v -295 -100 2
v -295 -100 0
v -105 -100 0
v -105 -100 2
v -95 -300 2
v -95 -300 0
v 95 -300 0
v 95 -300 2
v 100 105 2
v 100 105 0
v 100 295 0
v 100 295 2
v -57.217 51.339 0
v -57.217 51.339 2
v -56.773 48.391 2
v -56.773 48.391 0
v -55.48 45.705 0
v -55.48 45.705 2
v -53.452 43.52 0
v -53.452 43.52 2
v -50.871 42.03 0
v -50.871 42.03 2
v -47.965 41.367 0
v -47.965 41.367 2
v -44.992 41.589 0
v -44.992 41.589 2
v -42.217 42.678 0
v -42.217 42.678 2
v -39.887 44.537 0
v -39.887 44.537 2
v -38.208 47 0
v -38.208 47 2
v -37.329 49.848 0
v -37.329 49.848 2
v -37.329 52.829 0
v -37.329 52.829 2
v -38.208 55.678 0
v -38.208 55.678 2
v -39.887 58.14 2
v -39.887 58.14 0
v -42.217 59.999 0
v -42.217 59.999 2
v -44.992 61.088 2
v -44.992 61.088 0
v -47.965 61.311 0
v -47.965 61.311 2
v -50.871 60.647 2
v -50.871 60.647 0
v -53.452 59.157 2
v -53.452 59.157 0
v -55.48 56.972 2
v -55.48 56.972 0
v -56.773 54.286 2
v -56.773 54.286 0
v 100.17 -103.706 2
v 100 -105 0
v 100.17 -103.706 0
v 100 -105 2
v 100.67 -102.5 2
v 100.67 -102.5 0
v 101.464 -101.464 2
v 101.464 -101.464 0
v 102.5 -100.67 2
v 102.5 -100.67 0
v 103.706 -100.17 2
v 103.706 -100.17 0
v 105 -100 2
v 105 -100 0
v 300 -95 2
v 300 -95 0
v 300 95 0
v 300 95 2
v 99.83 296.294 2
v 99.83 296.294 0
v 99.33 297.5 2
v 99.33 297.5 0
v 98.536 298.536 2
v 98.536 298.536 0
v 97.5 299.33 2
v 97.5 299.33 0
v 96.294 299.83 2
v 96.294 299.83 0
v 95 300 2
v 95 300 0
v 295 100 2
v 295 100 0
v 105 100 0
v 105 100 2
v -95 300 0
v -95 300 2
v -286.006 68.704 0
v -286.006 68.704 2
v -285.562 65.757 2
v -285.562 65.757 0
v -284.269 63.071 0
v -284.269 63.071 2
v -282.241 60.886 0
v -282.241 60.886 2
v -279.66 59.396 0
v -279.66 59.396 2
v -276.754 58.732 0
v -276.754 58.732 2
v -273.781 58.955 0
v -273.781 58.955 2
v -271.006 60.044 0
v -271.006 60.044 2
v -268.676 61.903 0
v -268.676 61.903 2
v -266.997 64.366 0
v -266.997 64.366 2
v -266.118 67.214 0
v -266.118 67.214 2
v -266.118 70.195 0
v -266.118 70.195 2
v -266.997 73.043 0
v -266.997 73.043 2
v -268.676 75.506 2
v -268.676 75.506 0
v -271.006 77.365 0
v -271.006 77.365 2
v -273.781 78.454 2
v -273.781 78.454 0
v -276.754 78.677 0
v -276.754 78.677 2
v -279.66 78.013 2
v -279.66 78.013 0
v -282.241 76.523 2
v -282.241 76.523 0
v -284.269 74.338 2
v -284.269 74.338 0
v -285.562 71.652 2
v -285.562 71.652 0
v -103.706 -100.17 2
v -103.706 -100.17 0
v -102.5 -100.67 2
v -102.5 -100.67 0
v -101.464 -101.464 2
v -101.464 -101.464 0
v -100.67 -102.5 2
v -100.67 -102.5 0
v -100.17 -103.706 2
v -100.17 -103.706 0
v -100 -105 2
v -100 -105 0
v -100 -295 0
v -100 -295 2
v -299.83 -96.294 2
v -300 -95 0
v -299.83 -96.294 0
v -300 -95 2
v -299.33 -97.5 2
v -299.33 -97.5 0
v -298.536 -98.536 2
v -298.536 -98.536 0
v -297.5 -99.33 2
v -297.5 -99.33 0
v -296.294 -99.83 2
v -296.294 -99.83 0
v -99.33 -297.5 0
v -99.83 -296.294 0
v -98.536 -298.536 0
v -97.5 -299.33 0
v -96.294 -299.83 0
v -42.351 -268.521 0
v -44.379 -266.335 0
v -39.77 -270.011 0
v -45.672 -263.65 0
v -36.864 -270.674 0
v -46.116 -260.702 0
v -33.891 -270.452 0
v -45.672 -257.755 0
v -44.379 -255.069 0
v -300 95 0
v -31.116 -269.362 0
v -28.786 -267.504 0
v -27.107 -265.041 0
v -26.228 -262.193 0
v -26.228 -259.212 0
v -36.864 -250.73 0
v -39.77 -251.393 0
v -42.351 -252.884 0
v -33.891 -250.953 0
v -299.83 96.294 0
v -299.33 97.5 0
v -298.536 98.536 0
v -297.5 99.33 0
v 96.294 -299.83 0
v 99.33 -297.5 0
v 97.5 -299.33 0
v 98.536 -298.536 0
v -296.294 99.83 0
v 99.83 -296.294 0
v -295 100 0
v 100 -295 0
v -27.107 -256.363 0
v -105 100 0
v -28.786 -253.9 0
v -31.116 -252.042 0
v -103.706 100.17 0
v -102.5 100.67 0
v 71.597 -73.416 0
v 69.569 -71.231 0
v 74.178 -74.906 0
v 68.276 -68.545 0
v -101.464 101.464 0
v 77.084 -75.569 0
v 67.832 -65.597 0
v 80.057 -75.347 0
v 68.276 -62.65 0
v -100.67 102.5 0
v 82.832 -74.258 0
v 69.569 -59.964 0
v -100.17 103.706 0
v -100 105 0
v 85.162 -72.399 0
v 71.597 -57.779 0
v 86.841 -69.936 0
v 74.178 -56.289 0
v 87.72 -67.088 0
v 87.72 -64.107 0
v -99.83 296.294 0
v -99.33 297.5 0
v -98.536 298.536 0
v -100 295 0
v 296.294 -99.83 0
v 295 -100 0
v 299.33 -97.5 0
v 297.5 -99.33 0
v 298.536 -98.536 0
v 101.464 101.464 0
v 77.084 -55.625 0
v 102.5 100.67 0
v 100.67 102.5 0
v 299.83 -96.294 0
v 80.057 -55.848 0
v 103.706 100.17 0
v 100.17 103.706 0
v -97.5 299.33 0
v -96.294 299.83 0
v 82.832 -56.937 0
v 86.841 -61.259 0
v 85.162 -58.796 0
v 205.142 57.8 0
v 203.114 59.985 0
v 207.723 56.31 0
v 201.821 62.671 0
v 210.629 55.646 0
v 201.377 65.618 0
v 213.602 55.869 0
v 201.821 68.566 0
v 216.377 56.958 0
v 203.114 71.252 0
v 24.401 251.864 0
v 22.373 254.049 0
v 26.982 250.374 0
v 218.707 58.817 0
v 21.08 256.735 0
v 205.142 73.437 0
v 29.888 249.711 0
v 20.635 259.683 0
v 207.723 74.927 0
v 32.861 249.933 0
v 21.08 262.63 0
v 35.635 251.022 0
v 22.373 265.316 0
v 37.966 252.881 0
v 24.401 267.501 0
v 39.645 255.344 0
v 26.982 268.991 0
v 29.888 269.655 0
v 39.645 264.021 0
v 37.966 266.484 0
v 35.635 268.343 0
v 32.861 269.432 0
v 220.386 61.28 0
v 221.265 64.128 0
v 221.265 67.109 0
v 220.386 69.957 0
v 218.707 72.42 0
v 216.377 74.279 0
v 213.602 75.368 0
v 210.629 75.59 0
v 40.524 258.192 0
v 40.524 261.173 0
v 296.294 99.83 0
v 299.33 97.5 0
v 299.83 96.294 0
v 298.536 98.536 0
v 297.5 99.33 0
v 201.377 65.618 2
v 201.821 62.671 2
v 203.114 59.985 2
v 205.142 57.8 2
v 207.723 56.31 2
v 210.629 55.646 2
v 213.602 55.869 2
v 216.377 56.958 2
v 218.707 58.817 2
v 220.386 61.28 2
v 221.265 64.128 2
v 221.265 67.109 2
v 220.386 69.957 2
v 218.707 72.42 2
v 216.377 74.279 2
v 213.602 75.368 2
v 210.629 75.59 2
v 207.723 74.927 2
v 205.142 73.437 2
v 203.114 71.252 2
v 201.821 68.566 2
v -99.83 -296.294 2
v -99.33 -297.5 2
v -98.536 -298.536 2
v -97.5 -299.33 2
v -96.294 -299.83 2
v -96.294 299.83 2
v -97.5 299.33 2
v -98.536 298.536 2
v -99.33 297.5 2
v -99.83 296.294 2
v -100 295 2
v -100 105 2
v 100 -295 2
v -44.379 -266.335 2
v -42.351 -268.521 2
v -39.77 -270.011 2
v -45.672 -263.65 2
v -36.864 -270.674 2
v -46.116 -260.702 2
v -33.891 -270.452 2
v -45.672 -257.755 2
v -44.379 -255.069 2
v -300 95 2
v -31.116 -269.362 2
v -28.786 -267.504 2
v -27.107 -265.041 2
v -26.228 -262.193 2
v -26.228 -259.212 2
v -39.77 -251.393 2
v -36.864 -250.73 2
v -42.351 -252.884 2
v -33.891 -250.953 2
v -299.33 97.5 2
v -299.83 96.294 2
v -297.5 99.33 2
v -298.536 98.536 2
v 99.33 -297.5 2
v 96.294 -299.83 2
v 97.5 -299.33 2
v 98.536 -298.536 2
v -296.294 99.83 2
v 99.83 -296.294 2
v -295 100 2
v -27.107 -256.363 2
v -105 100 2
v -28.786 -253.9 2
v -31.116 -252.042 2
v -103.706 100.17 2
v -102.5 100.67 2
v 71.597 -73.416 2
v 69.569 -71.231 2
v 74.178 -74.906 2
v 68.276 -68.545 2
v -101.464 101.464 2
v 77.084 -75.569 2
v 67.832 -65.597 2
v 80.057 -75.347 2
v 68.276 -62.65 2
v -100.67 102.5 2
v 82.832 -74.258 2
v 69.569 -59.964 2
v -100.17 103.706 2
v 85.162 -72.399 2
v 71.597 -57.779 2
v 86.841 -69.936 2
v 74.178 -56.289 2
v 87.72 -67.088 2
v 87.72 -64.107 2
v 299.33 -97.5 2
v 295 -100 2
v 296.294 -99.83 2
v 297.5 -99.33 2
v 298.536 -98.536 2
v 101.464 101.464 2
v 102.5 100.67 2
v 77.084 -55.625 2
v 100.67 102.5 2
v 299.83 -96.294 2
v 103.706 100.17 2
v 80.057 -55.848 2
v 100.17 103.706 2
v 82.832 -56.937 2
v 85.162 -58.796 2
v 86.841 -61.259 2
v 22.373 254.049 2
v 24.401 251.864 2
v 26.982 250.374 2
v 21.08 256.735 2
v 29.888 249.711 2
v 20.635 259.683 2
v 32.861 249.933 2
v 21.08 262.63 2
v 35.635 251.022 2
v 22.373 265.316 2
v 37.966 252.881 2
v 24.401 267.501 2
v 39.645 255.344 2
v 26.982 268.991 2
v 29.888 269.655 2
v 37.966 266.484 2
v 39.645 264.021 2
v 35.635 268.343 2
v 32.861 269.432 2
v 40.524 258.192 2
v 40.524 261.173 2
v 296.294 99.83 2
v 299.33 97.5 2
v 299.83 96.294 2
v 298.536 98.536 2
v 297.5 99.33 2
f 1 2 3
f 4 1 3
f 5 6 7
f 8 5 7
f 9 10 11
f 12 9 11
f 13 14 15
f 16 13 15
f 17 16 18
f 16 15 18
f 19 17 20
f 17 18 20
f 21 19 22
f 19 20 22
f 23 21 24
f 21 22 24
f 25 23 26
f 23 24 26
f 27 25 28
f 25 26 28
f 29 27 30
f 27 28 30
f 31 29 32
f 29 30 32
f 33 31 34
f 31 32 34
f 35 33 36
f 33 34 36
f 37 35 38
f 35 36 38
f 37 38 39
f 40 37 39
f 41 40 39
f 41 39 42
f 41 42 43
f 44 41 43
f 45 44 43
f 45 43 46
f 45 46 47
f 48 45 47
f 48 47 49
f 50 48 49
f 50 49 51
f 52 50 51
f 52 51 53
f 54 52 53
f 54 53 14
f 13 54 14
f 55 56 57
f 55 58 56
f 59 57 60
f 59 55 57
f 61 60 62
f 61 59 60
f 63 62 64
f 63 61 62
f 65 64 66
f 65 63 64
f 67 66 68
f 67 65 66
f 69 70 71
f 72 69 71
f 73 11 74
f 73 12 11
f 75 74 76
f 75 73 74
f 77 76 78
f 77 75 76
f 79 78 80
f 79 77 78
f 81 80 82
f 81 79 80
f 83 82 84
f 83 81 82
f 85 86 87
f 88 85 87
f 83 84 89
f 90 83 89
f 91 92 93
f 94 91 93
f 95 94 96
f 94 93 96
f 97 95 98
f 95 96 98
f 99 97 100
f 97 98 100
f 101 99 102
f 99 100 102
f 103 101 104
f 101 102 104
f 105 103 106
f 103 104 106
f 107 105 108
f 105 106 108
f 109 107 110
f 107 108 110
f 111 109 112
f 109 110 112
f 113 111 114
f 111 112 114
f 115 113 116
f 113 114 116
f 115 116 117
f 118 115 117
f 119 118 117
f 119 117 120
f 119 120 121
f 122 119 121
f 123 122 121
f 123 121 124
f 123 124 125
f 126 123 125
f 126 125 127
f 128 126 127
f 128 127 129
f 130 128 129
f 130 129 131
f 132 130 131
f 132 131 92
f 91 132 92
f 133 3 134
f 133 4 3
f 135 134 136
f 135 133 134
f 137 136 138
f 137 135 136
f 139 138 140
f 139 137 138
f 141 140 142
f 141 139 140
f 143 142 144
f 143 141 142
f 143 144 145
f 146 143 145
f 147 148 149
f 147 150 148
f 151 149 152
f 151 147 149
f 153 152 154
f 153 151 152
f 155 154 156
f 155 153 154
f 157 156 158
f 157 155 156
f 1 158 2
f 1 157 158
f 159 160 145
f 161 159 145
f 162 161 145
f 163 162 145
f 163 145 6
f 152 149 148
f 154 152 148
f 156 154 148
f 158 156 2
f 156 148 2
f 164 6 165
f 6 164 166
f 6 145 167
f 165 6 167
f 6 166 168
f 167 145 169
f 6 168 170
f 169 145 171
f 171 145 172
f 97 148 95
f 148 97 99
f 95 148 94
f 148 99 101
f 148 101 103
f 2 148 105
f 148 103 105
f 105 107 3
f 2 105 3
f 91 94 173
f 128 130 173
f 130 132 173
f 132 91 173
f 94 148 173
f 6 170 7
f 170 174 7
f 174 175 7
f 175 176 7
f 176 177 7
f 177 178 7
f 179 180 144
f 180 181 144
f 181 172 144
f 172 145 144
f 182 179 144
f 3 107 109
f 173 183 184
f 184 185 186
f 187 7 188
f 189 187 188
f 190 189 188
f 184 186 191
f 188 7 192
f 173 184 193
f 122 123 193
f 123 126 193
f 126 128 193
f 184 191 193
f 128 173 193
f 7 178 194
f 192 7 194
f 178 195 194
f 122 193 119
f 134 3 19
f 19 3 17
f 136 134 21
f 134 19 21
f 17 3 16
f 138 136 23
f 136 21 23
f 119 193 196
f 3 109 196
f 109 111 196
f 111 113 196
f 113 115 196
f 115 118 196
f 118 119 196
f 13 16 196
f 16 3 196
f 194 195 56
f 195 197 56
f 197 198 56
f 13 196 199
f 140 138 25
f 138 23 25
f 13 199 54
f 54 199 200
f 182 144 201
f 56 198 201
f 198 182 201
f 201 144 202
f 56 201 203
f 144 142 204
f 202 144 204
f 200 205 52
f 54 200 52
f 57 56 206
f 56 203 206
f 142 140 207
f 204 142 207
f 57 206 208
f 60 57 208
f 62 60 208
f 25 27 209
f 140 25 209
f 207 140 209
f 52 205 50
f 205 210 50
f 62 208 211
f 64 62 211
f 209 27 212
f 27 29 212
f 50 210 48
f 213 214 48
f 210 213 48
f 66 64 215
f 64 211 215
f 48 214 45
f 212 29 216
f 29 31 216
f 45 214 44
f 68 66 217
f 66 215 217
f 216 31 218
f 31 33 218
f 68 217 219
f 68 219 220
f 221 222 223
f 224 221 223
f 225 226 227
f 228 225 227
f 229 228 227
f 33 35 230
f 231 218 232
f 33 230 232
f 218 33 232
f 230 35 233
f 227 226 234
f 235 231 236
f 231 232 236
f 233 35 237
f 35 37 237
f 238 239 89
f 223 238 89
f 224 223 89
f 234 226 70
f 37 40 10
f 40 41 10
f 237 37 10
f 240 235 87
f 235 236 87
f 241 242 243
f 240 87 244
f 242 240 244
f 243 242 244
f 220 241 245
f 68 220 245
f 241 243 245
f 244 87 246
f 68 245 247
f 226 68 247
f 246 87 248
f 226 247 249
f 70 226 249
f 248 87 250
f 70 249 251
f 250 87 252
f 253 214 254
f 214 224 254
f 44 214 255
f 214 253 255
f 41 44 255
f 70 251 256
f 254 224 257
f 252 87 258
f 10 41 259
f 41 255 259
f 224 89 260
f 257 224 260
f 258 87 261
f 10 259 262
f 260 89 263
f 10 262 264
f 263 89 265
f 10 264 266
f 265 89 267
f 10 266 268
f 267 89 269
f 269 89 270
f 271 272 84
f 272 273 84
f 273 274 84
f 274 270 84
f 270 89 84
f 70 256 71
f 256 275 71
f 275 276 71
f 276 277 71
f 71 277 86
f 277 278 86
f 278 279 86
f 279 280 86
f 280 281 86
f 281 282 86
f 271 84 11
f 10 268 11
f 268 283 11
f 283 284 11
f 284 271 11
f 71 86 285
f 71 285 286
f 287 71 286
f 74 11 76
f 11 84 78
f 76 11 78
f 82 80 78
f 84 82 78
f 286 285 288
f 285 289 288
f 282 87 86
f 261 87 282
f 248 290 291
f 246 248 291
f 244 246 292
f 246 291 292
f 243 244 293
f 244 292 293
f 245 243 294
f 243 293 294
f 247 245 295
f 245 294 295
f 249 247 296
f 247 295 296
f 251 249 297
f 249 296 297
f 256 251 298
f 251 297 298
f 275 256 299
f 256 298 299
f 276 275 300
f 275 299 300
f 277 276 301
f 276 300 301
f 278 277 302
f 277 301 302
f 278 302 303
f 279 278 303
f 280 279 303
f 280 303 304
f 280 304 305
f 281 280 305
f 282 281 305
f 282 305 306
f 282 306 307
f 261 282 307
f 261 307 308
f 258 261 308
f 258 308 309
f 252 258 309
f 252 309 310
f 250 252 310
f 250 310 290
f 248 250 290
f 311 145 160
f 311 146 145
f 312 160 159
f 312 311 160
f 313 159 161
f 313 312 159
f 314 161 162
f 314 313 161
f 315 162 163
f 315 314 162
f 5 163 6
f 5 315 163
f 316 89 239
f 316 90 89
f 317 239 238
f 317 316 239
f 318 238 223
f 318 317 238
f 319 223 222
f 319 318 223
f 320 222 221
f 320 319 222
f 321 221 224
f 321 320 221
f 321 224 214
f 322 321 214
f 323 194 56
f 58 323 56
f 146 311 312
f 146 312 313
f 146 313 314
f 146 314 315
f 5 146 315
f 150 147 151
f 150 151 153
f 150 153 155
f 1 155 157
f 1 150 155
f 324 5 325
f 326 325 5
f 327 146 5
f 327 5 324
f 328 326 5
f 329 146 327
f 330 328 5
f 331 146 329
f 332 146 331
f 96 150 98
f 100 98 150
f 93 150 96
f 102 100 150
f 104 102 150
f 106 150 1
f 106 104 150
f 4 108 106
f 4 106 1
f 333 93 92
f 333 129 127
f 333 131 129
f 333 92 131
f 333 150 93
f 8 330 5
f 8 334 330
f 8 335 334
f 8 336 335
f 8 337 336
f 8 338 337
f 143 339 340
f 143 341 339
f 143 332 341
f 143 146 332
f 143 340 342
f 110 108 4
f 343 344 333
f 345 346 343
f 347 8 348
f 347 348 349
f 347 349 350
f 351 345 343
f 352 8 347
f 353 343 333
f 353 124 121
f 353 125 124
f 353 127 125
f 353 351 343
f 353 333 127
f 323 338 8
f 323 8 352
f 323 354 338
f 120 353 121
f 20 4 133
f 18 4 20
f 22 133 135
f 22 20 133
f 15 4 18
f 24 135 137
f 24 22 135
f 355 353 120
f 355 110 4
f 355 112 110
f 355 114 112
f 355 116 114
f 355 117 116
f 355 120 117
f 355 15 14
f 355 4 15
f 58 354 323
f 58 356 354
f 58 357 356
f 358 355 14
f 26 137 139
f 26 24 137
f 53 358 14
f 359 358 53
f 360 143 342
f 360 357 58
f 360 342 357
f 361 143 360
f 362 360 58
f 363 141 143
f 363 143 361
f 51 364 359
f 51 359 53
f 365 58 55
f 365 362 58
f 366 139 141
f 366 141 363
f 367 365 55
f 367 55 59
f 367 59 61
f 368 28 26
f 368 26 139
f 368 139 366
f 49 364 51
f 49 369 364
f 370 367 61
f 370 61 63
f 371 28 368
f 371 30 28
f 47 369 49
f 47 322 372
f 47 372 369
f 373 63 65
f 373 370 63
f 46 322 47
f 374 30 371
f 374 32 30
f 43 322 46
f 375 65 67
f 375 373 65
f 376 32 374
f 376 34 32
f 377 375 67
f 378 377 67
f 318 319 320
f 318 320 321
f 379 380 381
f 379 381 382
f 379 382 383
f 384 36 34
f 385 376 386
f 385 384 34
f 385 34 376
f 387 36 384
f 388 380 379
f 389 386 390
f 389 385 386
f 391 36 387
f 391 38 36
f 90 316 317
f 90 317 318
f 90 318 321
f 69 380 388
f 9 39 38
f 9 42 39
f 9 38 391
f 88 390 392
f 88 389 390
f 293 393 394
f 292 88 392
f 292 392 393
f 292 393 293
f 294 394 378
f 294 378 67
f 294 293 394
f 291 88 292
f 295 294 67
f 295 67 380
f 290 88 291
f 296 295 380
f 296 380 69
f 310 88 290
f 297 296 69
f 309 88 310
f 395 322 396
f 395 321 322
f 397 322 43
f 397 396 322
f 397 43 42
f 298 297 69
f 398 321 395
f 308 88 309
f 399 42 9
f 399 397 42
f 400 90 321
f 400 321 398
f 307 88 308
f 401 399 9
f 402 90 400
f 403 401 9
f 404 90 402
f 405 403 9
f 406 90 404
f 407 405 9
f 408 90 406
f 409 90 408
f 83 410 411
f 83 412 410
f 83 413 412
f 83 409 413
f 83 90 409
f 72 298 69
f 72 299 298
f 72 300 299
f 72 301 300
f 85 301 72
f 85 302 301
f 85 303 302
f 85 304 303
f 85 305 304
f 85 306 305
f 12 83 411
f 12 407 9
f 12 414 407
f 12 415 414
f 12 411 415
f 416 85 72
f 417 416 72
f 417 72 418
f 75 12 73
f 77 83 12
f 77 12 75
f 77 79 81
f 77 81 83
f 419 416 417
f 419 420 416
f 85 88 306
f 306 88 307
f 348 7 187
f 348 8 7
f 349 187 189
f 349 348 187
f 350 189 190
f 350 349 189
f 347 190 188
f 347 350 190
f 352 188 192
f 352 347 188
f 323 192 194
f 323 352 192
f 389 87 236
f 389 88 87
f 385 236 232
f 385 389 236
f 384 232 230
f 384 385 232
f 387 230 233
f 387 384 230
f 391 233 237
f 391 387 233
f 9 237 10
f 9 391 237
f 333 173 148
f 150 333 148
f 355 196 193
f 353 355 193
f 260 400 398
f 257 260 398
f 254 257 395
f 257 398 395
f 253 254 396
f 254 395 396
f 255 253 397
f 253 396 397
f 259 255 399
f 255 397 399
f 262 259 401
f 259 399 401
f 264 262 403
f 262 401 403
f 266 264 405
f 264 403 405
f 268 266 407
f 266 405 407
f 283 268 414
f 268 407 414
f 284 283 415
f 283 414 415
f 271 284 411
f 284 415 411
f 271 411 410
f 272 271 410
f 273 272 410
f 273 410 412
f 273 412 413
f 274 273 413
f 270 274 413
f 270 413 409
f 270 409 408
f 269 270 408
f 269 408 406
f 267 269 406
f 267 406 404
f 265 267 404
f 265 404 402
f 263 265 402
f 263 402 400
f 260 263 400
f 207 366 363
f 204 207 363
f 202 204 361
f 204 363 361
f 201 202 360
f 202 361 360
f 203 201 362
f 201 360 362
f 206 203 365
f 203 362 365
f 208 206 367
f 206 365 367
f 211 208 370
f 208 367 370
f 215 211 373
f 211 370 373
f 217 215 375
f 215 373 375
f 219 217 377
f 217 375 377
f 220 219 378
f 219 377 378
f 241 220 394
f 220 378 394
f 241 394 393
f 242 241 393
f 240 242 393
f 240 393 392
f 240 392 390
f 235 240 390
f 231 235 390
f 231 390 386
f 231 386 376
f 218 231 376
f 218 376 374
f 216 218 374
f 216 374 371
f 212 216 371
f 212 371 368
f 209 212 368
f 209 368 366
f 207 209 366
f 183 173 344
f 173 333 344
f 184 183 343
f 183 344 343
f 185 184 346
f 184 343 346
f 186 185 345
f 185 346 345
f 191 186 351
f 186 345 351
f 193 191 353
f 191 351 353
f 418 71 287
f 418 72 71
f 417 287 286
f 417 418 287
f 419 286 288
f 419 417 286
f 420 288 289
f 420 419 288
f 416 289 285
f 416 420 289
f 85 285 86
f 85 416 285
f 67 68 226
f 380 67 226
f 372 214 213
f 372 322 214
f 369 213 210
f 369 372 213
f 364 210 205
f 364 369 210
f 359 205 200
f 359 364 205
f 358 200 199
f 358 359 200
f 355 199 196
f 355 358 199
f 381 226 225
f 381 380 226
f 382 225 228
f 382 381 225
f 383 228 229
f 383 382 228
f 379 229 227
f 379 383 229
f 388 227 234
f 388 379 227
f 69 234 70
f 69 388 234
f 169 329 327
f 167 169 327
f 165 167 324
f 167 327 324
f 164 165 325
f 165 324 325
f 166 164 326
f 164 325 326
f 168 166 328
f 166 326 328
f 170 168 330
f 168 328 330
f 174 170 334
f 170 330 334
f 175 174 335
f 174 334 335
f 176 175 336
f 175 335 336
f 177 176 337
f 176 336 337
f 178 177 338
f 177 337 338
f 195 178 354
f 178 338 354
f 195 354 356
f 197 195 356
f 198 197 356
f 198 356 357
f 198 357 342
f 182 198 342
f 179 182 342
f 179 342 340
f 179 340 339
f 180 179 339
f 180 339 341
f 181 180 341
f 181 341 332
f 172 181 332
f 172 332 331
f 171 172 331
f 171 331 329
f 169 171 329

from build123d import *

# Parameters (mm, degrees)
F1_DEPTH = 2
F2_R     = 5
F4_D     = 20
F4_DEPTH = 50
F4_TIP   = 6.0086061903


with BuildPart() as f1:
    # F0 (on Top) → F1 (new body)
    with BuildSketch(Plane.XY):
        Polygon((-300, 100), (-300, -100), (-100, -100), (-100, -300), (100, -300), (100, -100), (300, -100), (300, 100), (100, 100), (100, 300), (-100, 300), (-100, 100), align=None)
    extrude(amount=F1_DEPTH)

    # F2
    f2_edges = [f1.edges().sort_by_distance(p)[0] for p in [
        (-300, -100, 1),
        (-100, -100, 1),
        (-100, -300, 1),
        (100, -300, 1),
        (-300, 100, 1),
        (-100, 300, 1),
        (100, 300, 1),
        (100, 100, 1),
        (300, 100, 1),
        (300, -100, 1),
        (-100, 100, 1),
        (100, -100, 1),
    ]]
    fillet(f2_edges, radius=F2_R)

    # F4
    with Locations(Plane(origin=(0, 0, 0), x_dir=(1, 0, 0), z_dir=(0, 0, -1))):
        with Locations((-276.0063111782, -68.7044858932), (-47.2173690796, -51.3386949897), (77.8317674994, 65.5974373221), (-36.1162610352, 260.7022225857), (211.3765329123, -65.6183883548), (30.6354723871, -259.6825659275)):
            Hole(F4_D / 2, depth=F4_DEPTH)
            with Locations((0, 0, -(F4_DEPTH + F4_TIP / 2))):  # 118° drill point
                Cone(0, F4_D / 2, F4_TIP, mode=Mode.SUBTRACT)


solid = f1.part
